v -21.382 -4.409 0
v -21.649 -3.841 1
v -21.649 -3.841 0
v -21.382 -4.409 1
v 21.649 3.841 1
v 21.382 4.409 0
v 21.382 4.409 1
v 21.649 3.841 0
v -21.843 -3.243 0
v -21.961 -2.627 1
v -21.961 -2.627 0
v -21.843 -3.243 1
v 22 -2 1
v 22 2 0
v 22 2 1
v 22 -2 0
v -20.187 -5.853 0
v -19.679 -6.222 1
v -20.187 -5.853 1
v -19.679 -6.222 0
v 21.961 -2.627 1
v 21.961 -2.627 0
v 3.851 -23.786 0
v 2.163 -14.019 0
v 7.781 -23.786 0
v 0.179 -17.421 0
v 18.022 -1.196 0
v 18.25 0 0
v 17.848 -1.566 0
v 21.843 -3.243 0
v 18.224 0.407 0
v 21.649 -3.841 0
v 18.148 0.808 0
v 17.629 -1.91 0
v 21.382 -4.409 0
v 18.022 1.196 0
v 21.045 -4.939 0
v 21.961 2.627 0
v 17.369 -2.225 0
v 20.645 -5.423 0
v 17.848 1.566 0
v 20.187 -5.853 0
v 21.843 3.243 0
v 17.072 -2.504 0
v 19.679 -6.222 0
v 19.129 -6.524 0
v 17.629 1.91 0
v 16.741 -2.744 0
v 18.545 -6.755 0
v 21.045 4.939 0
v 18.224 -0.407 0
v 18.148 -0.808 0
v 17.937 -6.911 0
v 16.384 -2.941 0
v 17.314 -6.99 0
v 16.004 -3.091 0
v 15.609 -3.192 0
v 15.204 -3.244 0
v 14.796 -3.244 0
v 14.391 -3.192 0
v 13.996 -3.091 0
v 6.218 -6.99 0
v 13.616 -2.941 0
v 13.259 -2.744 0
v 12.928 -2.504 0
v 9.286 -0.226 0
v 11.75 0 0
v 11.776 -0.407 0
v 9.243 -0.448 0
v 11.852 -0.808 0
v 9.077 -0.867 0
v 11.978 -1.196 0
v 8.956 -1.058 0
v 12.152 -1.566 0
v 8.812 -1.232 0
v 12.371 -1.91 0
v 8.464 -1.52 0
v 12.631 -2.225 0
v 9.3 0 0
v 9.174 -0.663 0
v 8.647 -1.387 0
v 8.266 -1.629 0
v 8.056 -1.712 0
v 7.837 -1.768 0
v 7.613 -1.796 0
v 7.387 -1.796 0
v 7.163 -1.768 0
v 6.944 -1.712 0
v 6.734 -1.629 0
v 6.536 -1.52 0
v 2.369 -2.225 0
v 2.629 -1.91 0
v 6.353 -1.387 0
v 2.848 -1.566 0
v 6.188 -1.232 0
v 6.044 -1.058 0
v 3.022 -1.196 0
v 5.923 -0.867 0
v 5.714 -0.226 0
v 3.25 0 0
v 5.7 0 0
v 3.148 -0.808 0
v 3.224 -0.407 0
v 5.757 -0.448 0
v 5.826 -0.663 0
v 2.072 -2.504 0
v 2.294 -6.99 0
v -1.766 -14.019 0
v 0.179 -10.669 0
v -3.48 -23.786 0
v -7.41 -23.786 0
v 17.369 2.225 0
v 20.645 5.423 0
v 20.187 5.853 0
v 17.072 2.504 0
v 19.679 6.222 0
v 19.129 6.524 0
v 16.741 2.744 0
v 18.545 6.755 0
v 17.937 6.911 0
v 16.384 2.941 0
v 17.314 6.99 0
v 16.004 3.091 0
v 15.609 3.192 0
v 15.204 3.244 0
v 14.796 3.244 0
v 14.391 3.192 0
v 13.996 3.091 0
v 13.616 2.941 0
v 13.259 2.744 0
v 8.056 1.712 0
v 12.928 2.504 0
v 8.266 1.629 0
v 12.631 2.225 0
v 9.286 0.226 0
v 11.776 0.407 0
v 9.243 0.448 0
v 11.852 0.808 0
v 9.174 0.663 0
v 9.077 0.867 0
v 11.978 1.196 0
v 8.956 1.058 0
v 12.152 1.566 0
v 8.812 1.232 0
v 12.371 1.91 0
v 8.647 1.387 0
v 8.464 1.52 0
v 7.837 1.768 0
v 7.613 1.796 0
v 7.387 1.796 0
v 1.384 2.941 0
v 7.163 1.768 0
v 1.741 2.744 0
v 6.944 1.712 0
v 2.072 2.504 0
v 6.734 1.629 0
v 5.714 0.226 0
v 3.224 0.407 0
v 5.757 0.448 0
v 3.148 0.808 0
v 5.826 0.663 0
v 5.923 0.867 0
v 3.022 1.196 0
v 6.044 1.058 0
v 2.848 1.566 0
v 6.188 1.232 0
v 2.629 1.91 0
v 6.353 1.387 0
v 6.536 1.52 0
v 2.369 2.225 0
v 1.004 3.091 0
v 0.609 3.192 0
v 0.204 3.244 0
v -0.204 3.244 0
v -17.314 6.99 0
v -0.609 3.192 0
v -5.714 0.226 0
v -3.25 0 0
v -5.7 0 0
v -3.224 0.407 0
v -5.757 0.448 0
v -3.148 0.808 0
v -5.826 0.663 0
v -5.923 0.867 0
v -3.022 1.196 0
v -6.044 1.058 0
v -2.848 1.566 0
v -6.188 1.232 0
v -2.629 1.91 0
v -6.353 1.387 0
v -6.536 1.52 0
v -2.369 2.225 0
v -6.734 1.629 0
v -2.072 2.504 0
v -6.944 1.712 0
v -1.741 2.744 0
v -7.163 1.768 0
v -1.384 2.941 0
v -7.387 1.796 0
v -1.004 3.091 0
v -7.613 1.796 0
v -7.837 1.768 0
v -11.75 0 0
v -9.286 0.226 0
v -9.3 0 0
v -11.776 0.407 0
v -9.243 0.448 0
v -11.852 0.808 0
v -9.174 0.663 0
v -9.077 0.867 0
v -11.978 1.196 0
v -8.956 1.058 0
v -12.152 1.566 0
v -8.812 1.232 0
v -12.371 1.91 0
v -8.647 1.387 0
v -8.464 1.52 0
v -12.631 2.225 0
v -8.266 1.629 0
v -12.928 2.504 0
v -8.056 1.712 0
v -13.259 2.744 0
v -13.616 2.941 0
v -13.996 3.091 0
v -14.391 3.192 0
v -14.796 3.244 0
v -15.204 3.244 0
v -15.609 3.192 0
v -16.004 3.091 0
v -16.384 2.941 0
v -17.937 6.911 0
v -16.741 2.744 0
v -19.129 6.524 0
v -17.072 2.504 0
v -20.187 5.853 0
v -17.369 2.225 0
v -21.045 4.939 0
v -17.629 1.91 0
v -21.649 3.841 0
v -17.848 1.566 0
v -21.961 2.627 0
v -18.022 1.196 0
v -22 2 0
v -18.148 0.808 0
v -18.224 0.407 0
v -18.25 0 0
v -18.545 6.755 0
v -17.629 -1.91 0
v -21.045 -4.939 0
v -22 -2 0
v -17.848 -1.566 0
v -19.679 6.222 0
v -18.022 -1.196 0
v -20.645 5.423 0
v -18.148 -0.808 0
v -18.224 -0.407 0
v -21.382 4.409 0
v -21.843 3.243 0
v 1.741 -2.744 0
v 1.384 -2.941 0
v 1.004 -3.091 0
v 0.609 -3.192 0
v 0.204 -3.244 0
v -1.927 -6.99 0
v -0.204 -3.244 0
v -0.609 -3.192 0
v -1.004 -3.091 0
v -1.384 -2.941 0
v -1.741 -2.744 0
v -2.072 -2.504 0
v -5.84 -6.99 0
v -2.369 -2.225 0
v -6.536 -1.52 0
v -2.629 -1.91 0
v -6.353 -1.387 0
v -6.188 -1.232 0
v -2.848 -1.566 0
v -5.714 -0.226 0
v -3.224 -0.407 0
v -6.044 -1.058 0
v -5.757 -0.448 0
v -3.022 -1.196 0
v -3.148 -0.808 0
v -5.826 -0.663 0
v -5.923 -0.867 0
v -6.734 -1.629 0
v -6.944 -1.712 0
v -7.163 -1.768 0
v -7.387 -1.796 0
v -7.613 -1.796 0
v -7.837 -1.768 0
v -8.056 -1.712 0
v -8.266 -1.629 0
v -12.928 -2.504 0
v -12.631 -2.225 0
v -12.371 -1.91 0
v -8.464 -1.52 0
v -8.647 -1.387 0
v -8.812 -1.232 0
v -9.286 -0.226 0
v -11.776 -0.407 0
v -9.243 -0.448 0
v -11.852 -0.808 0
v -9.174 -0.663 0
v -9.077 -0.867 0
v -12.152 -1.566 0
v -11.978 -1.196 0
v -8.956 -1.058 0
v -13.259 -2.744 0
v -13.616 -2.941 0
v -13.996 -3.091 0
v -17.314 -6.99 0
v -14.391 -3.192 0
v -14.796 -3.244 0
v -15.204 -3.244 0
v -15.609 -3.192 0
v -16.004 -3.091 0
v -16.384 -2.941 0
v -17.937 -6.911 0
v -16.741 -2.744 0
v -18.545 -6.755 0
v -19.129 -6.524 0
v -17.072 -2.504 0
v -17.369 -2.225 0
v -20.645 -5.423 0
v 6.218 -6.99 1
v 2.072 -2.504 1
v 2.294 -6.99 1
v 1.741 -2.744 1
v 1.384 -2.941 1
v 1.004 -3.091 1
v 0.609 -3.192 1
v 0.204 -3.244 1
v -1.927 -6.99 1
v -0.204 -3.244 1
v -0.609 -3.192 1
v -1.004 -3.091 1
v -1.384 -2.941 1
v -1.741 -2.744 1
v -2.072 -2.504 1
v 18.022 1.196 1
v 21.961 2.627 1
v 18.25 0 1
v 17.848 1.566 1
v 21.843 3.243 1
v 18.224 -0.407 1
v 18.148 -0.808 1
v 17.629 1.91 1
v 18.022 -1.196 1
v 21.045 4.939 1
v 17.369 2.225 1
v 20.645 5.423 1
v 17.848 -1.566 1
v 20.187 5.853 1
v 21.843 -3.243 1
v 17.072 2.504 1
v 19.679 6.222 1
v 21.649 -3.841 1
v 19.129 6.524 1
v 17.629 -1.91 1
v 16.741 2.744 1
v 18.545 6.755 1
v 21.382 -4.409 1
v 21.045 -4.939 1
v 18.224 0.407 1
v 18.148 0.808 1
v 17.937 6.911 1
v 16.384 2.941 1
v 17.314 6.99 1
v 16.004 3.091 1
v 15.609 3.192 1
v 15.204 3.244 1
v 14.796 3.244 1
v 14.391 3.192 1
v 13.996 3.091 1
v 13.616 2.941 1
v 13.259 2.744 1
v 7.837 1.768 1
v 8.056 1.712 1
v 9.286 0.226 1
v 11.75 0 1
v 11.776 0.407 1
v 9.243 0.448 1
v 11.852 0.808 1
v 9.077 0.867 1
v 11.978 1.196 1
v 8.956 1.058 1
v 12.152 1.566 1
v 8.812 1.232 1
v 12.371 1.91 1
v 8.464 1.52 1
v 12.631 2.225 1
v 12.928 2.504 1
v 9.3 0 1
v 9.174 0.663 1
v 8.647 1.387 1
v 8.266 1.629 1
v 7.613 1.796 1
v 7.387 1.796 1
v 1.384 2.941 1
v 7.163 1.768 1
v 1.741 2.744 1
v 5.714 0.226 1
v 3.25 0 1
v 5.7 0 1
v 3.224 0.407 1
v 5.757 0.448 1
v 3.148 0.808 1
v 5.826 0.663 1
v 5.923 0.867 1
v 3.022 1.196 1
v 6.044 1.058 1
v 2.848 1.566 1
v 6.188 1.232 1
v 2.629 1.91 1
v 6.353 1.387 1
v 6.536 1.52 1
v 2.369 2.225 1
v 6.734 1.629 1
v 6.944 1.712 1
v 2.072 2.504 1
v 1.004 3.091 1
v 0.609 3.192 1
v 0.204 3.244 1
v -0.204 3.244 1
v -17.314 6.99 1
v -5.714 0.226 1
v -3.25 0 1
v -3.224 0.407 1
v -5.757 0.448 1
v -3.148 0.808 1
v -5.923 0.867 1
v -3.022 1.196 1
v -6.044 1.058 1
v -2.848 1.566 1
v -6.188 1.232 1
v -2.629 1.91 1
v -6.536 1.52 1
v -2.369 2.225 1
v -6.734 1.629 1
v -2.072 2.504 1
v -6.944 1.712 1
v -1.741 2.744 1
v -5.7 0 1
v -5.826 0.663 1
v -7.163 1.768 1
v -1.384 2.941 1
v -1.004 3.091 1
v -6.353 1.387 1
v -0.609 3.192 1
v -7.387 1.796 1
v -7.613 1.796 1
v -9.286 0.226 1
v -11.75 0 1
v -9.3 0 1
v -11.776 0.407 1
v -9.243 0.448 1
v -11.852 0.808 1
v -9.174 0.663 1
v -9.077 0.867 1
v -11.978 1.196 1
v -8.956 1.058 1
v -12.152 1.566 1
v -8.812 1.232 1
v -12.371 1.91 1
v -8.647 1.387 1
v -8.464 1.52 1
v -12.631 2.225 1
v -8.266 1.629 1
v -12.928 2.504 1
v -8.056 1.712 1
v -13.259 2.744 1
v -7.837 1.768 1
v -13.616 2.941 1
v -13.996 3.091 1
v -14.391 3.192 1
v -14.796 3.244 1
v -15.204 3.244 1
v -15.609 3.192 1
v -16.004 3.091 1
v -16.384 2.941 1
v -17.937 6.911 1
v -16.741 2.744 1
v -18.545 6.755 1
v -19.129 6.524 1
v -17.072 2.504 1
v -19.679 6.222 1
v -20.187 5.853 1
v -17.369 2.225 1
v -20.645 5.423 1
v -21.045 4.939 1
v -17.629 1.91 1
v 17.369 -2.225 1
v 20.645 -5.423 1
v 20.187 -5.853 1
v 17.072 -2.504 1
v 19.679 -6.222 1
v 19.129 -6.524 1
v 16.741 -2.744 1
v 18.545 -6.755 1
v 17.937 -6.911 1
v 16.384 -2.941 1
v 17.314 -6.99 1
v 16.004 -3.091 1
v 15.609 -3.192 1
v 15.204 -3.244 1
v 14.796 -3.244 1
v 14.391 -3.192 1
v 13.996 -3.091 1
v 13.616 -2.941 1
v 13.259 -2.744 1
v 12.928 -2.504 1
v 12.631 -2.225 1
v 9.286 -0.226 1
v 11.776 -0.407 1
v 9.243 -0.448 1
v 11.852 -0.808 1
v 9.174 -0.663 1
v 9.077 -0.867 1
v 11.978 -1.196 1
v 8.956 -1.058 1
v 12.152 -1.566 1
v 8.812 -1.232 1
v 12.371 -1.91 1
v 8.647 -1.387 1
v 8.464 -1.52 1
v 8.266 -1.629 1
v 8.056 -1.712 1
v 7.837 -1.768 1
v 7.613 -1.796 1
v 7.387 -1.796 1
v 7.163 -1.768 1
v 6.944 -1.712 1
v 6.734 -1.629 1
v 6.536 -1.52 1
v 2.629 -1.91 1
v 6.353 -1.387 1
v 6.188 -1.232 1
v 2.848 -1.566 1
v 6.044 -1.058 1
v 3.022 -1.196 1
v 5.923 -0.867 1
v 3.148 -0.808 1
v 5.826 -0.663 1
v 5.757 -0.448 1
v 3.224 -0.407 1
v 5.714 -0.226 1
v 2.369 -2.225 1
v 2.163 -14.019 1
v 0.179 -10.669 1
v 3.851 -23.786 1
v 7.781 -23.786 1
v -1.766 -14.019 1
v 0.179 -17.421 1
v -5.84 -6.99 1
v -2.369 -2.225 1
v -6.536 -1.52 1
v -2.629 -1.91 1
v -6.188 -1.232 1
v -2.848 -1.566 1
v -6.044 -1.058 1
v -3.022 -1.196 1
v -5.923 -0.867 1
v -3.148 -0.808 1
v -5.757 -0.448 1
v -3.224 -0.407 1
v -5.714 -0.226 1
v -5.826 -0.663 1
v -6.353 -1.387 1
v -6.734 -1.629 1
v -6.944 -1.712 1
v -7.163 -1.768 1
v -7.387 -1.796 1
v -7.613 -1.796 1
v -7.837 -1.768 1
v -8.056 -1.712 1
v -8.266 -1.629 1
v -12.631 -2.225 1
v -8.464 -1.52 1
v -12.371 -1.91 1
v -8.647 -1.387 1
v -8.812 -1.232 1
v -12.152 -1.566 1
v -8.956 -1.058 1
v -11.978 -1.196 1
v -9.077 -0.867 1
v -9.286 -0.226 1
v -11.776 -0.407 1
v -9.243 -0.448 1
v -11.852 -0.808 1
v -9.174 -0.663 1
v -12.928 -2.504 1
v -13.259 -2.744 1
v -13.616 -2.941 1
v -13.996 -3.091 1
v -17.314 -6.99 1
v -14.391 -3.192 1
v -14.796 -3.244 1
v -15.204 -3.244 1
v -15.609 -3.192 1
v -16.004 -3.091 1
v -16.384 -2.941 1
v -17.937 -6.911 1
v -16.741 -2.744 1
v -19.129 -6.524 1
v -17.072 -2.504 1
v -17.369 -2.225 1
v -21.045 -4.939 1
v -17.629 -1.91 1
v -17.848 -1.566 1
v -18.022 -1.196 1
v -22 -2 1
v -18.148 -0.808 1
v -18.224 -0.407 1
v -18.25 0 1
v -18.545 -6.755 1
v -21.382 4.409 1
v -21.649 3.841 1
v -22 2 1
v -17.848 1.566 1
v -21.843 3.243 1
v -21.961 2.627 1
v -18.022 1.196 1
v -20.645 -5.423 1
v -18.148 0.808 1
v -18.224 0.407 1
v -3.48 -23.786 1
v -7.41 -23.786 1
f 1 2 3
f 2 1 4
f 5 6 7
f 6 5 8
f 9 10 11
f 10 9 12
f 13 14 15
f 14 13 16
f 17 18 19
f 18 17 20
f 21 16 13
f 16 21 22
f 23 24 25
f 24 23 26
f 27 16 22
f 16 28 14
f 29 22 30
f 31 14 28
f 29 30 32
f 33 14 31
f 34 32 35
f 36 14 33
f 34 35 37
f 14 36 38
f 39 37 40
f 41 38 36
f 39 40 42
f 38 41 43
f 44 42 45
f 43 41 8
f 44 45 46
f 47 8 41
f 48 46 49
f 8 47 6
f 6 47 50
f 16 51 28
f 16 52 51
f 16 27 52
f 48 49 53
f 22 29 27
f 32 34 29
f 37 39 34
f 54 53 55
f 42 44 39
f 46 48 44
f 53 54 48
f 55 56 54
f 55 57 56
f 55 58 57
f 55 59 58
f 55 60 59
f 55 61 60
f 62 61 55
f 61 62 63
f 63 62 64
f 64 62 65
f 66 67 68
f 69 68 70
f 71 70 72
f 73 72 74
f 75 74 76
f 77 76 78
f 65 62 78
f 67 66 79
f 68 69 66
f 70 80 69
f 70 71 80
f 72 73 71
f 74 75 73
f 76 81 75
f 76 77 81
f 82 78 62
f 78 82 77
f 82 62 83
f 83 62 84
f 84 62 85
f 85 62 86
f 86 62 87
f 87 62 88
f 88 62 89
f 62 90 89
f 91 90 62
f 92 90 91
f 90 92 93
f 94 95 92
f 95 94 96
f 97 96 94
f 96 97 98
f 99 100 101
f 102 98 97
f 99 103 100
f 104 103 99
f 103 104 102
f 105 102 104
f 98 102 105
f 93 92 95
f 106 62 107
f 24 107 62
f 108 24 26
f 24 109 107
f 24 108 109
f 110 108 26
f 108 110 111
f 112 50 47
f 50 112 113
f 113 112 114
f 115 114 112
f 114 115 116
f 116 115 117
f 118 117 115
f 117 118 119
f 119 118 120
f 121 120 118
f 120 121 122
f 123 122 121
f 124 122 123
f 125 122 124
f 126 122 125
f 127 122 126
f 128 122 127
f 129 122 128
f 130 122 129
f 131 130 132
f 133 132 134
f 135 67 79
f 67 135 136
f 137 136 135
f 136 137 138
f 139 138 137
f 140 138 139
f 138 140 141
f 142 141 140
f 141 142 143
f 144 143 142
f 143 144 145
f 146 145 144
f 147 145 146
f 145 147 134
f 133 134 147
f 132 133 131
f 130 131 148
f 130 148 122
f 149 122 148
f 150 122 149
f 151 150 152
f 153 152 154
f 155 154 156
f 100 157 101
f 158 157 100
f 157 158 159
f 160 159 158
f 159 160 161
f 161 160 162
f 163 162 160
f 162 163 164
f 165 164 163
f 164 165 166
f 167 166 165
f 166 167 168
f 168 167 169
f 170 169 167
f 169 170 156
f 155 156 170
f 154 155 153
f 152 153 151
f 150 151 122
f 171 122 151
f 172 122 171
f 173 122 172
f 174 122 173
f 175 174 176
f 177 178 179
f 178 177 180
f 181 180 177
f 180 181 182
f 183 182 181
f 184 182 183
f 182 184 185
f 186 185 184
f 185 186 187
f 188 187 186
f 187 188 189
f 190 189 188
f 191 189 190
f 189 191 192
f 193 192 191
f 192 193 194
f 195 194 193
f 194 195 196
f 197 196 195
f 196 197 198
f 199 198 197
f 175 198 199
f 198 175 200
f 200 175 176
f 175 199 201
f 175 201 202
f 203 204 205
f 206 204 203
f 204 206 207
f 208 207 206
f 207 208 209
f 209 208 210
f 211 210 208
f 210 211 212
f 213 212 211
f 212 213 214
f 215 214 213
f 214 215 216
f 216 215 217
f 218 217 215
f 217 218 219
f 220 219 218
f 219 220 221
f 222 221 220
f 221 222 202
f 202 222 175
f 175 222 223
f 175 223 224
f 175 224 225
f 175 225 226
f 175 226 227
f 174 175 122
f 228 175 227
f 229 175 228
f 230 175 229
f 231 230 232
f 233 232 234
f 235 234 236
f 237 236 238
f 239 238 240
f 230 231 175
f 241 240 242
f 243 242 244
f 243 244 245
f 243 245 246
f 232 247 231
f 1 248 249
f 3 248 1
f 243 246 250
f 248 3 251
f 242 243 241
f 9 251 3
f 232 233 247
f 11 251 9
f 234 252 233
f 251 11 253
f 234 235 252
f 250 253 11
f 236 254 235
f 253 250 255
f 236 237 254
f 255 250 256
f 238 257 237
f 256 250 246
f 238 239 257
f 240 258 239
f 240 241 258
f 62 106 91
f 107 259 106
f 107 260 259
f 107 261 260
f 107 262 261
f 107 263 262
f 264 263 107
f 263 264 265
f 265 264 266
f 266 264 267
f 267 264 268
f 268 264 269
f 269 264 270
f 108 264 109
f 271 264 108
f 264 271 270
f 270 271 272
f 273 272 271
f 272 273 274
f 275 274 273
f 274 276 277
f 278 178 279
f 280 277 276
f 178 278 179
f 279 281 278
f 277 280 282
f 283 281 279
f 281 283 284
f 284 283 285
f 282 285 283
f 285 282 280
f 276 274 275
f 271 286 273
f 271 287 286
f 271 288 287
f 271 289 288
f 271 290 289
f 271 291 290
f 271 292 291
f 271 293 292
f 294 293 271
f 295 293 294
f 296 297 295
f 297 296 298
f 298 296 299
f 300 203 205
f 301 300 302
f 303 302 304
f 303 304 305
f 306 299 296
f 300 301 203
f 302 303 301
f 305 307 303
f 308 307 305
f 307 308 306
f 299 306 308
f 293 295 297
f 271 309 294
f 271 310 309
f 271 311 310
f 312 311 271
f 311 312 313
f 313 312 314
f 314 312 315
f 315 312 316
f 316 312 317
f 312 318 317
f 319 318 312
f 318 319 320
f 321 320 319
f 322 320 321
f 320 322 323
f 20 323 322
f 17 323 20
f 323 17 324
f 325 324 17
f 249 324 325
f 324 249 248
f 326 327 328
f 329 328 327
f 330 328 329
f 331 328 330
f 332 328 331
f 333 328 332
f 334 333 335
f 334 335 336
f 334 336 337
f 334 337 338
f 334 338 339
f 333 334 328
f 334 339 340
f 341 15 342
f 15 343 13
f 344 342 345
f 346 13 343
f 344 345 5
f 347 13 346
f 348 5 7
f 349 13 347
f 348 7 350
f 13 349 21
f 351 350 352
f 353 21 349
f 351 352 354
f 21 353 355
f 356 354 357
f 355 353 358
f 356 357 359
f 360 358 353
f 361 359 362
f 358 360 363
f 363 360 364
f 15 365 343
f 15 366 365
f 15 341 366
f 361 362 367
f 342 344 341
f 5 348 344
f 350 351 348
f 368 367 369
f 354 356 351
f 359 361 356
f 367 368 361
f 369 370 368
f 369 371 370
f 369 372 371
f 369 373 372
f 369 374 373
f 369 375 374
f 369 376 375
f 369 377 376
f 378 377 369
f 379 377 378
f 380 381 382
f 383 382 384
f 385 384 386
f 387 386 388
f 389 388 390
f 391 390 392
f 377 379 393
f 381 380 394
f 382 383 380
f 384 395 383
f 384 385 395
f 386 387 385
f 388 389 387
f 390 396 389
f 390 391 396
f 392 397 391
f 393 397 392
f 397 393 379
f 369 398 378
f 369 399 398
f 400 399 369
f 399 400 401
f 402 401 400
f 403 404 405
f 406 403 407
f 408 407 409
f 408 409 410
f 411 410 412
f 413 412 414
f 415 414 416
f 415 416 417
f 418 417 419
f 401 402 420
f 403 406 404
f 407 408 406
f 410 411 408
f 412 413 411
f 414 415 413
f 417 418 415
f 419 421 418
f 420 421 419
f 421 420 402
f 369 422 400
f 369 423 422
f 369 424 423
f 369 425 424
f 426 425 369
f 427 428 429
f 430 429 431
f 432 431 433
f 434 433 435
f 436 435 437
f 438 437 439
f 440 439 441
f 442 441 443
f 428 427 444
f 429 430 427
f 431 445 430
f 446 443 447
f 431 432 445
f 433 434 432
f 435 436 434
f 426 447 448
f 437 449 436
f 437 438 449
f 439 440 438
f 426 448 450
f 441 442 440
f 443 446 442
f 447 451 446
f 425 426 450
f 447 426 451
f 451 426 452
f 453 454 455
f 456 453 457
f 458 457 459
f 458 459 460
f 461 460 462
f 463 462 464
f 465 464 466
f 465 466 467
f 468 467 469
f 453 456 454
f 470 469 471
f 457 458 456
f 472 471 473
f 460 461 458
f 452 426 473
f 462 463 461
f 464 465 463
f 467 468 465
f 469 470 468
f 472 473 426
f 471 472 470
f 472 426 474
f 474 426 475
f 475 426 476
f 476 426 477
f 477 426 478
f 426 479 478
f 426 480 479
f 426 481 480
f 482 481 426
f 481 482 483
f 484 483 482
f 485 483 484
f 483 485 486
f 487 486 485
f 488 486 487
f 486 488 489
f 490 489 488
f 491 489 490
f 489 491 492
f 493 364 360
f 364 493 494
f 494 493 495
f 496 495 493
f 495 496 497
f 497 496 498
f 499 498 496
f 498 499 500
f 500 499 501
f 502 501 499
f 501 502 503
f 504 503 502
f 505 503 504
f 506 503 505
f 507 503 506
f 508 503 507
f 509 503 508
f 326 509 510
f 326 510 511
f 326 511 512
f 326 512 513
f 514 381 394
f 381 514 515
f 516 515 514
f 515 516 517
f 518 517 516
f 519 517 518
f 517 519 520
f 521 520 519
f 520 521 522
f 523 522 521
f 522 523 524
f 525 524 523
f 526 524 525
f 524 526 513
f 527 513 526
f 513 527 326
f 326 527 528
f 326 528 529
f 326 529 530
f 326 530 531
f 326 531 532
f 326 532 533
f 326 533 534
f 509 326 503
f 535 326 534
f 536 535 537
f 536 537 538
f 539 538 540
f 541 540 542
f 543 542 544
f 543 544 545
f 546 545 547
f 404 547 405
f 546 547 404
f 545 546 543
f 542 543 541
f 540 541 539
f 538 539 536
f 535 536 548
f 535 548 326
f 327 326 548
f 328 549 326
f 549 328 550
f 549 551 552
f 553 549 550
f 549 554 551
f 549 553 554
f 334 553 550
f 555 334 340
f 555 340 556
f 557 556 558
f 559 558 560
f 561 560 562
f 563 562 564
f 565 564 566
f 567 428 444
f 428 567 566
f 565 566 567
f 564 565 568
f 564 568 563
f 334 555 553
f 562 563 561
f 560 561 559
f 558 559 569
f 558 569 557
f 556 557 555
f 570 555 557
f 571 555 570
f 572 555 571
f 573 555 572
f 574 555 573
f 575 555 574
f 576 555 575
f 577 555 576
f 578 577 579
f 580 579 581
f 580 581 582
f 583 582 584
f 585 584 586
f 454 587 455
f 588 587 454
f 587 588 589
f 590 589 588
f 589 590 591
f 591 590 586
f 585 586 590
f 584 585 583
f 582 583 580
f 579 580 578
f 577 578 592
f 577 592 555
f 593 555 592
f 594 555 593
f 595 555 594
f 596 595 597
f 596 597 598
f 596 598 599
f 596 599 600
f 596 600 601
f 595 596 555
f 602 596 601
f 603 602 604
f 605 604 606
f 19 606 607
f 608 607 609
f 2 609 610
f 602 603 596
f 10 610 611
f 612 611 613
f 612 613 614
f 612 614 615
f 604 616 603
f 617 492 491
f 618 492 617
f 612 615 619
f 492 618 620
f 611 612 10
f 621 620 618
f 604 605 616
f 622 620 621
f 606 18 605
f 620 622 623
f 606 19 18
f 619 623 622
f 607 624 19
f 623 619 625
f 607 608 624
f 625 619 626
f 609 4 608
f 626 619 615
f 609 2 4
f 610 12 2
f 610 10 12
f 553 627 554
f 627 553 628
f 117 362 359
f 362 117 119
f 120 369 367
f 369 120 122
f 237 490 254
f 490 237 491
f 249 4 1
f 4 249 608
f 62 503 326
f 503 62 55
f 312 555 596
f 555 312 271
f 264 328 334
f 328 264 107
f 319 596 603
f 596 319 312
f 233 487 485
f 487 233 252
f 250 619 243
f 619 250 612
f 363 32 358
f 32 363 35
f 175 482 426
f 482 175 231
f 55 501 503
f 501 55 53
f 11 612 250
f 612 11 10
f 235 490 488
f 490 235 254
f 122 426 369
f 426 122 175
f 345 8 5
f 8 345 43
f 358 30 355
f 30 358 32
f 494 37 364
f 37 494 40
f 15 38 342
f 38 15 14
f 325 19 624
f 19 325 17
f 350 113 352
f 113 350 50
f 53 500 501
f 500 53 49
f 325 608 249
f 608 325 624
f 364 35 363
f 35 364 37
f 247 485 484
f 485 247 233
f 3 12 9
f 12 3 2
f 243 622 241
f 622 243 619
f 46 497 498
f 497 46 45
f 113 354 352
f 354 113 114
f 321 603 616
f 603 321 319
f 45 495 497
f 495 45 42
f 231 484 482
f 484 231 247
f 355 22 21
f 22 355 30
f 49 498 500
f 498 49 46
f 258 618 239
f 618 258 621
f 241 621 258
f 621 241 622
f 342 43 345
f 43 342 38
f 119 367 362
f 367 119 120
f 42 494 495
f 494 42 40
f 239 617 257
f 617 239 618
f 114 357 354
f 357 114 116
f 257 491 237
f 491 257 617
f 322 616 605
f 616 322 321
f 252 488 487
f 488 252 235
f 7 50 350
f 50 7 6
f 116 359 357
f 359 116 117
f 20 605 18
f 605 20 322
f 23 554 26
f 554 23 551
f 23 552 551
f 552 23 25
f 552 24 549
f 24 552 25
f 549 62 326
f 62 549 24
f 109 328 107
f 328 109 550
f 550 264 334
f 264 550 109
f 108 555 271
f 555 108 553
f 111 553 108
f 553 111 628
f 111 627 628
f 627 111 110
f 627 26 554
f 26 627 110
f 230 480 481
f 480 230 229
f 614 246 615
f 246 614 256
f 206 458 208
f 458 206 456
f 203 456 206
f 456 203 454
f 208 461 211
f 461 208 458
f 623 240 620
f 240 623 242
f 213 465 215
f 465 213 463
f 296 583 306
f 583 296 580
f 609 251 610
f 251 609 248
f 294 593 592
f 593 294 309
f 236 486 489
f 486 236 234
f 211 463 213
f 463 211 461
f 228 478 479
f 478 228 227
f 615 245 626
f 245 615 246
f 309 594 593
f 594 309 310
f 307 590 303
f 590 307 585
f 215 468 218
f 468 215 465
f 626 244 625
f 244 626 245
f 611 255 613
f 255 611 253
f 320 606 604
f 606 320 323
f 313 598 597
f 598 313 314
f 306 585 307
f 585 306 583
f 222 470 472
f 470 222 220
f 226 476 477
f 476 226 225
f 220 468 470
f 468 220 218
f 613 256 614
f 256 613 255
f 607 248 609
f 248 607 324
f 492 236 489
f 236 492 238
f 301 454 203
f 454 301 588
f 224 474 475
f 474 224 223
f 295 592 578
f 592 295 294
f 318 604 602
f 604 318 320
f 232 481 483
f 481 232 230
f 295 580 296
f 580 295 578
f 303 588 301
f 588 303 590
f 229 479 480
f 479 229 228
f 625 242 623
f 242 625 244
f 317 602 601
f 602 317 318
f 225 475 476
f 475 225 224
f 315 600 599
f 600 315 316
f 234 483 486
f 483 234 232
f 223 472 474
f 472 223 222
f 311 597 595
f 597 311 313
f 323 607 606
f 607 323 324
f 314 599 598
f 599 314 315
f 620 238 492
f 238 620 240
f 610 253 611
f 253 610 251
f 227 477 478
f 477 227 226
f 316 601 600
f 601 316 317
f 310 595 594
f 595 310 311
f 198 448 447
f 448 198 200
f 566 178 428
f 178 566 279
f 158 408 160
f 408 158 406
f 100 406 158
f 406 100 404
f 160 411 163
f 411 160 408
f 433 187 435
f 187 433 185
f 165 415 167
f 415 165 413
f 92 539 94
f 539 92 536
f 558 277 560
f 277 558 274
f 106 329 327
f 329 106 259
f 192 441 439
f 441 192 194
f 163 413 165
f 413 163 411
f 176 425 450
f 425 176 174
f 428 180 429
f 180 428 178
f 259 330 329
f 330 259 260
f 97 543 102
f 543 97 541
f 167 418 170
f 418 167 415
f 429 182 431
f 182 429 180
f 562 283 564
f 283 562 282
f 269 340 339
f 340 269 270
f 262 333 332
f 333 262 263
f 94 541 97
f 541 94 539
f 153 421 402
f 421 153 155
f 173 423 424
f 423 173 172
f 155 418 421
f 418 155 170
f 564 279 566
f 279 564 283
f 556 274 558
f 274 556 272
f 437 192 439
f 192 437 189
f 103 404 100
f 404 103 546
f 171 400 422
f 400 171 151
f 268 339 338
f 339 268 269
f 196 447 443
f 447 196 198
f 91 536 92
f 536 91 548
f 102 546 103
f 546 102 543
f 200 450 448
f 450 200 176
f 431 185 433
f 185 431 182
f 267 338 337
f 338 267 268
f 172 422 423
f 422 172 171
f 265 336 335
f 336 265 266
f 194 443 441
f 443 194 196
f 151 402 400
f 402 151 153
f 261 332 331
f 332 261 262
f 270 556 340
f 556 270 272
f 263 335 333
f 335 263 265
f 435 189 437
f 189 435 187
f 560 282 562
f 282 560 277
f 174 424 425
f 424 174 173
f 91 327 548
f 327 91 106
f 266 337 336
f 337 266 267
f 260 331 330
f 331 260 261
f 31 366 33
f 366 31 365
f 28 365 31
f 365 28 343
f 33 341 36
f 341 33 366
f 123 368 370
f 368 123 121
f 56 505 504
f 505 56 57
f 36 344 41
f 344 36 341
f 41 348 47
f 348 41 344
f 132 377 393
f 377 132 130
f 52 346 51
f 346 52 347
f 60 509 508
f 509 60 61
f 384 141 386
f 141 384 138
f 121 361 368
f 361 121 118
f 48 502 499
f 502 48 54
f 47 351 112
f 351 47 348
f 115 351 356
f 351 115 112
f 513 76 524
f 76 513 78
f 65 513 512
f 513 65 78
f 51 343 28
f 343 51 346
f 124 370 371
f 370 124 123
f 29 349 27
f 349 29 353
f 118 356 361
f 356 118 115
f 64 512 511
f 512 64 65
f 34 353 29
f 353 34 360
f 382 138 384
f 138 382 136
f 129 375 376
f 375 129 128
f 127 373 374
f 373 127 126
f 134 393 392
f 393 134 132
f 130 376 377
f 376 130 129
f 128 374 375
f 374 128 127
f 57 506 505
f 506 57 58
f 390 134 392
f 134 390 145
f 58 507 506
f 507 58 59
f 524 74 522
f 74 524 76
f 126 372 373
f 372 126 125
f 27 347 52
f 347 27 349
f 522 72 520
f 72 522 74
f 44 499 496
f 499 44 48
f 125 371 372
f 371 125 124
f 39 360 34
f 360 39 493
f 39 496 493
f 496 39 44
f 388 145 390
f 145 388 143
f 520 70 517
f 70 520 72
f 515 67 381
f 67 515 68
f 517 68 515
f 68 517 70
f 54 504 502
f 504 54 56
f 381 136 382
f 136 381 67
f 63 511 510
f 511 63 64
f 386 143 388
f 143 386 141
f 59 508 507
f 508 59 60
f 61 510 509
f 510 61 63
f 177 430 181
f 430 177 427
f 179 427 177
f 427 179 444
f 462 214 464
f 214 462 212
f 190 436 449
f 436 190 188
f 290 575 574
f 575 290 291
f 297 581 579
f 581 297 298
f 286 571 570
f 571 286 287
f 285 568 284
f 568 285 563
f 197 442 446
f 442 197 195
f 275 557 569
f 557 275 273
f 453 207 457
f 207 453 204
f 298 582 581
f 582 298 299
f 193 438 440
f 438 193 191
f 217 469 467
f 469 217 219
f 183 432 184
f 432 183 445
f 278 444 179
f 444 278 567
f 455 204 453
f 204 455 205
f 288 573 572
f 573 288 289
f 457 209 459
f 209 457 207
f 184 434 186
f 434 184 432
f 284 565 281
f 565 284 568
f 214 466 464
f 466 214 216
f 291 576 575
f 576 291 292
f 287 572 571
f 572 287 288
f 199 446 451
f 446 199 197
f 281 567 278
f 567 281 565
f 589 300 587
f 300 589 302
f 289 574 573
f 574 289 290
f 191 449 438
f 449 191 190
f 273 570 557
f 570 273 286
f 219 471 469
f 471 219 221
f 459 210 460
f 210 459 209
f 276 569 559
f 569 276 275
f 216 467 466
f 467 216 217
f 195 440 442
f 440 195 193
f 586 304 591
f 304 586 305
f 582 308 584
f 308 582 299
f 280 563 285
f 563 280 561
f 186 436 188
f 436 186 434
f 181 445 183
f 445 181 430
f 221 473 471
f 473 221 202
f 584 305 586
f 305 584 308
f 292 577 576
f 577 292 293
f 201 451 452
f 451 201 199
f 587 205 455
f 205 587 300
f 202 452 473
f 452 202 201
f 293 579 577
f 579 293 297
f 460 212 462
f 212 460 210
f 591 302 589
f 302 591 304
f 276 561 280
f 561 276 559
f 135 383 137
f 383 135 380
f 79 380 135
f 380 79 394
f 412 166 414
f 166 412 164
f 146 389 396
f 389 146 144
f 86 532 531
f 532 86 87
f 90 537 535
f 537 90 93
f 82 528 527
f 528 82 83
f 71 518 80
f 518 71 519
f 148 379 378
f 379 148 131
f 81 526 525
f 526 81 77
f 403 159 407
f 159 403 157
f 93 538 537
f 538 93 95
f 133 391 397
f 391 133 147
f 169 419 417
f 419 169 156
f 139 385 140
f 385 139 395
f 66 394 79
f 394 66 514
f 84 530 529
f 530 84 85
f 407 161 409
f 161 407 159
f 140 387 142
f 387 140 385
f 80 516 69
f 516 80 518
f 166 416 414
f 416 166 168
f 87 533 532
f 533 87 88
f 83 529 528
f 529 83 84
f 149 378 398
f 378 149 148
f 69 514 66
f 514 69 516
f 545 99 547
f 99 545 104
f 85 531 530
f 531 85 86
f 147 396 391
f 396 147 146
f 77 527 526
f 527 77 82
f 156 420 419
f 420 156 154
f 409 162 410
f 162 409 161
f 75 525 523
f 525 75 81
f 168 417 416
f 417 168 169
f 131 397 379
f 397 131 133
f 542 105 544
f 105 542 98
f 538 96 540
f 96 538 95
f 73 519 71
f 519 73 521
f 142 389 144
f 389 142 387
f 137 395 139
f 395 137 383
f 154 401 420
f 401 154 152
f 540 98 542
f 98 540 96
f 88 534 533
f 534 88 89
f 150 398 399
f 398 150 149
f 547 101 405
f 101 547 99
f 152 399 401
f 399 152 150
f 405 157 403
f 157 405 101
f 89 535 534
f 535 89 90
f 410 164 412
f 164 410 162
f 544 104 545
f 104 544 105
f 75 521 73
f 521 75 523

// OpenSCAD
$fn = 50;


difference() {
	union() {
		*color(alpha = 1.0000000000, c = "gray") {
			translate(v = [0, 14, 0]) {
				linear_extrude(height = 1) {
					text(font = "Arial:style=Bold", halign = "center", size = 4.5000000000, text = "COMMENT description oobb_plate_shape_p_type_1_depth_3_width_1_thickness_x_extra_oobb_size", valign = "center");
				}
			}
		}
		hull() {
			translate(v = [-17.0000000000, 2.0000000000, 0]) {
				cylinder(h = 1, r = 5);
			}
			translate(v = [17.0000000000, 2.0000000000, 0]) {
				cylinder(h = 1, r = 5);
			}
			translate(v = [-17.0000000000, -2.0000000000, 0]) {
				cylinder(h = 1, r = 5);
			}
			translate(v = [17.0000000000, -2.0000000000, 0]) {
				cylinder(h = 1, r = 5);
			}
		}
		translate(v = [0, -5, 0]) {
			linear_extrude(height = 1) {
				text(font = "DejaVu Sans Mono:style=Bold", halign = "center", size = 19.0000000000, text = "X", valign = "top");
			}
		}
	}
	union() {
		*color(alpha = 1.0000000000, c = "gray") {
			translate(v = [0, 14, 0]) {
				linear_extrude(height = 1) {
					text(font = "Arial:style=Bold", halign = "center", size = 4.5000000000, text = "COMMENT description oobb_holes_shape_n_type_3_width_1_thickness_x_extra_oobb_size_1_height_'all'_holes_true_both_holes", valign = "center");
				}
			}
		}
		translate(v = [-15.0000000000, 0.0000000000, 0]) {
			translate(v = [0, 0, -50]) {
				cylinder(h = 100, r = 3.2500000000);
			}
		}
		translate(v = [0, 0, -50]) {
			cylinder(h = 100, r = 3.2500000000);
		}
		translate(v = [15.0000000000, 0.0000000000, 0]) {
			translate(v = [0, 0, -50]) {
				cylinder(h = 100, r = 3.2500000000);
			}
		}
		translate(v = [-15.0000000000, 0.0000000000, 0]) {
			translate(v = [0, 0, -50]) {
				cylinder(h = 100, r = 1.8000000000);
			}
		}
		translate(v = [-7.5000000000, 0.0000000000, 0]) {
			translate(v = [0, 0, -50]) {
				cylinder(h = 100, r = 1.8000000000);
			}
		}
		translate(v = [0, 0, -50]) {
			cylinder(h = 100, r = 1.8000000000);
		}
		translate(v = [7.5000000000, 0.0000000000, 0]) {
			translate(v = [0, 0, -50]) {
				cylinder(h = 100, r = 1.8000000000);
			}
		}
		translate(v = [15.0000000000, 0.0000000000, 0]) {
			translate(v = [0, 0, -50]) {
				cylinder(h = 100, r = 1.8000000000);
			}
		}
	}
}
